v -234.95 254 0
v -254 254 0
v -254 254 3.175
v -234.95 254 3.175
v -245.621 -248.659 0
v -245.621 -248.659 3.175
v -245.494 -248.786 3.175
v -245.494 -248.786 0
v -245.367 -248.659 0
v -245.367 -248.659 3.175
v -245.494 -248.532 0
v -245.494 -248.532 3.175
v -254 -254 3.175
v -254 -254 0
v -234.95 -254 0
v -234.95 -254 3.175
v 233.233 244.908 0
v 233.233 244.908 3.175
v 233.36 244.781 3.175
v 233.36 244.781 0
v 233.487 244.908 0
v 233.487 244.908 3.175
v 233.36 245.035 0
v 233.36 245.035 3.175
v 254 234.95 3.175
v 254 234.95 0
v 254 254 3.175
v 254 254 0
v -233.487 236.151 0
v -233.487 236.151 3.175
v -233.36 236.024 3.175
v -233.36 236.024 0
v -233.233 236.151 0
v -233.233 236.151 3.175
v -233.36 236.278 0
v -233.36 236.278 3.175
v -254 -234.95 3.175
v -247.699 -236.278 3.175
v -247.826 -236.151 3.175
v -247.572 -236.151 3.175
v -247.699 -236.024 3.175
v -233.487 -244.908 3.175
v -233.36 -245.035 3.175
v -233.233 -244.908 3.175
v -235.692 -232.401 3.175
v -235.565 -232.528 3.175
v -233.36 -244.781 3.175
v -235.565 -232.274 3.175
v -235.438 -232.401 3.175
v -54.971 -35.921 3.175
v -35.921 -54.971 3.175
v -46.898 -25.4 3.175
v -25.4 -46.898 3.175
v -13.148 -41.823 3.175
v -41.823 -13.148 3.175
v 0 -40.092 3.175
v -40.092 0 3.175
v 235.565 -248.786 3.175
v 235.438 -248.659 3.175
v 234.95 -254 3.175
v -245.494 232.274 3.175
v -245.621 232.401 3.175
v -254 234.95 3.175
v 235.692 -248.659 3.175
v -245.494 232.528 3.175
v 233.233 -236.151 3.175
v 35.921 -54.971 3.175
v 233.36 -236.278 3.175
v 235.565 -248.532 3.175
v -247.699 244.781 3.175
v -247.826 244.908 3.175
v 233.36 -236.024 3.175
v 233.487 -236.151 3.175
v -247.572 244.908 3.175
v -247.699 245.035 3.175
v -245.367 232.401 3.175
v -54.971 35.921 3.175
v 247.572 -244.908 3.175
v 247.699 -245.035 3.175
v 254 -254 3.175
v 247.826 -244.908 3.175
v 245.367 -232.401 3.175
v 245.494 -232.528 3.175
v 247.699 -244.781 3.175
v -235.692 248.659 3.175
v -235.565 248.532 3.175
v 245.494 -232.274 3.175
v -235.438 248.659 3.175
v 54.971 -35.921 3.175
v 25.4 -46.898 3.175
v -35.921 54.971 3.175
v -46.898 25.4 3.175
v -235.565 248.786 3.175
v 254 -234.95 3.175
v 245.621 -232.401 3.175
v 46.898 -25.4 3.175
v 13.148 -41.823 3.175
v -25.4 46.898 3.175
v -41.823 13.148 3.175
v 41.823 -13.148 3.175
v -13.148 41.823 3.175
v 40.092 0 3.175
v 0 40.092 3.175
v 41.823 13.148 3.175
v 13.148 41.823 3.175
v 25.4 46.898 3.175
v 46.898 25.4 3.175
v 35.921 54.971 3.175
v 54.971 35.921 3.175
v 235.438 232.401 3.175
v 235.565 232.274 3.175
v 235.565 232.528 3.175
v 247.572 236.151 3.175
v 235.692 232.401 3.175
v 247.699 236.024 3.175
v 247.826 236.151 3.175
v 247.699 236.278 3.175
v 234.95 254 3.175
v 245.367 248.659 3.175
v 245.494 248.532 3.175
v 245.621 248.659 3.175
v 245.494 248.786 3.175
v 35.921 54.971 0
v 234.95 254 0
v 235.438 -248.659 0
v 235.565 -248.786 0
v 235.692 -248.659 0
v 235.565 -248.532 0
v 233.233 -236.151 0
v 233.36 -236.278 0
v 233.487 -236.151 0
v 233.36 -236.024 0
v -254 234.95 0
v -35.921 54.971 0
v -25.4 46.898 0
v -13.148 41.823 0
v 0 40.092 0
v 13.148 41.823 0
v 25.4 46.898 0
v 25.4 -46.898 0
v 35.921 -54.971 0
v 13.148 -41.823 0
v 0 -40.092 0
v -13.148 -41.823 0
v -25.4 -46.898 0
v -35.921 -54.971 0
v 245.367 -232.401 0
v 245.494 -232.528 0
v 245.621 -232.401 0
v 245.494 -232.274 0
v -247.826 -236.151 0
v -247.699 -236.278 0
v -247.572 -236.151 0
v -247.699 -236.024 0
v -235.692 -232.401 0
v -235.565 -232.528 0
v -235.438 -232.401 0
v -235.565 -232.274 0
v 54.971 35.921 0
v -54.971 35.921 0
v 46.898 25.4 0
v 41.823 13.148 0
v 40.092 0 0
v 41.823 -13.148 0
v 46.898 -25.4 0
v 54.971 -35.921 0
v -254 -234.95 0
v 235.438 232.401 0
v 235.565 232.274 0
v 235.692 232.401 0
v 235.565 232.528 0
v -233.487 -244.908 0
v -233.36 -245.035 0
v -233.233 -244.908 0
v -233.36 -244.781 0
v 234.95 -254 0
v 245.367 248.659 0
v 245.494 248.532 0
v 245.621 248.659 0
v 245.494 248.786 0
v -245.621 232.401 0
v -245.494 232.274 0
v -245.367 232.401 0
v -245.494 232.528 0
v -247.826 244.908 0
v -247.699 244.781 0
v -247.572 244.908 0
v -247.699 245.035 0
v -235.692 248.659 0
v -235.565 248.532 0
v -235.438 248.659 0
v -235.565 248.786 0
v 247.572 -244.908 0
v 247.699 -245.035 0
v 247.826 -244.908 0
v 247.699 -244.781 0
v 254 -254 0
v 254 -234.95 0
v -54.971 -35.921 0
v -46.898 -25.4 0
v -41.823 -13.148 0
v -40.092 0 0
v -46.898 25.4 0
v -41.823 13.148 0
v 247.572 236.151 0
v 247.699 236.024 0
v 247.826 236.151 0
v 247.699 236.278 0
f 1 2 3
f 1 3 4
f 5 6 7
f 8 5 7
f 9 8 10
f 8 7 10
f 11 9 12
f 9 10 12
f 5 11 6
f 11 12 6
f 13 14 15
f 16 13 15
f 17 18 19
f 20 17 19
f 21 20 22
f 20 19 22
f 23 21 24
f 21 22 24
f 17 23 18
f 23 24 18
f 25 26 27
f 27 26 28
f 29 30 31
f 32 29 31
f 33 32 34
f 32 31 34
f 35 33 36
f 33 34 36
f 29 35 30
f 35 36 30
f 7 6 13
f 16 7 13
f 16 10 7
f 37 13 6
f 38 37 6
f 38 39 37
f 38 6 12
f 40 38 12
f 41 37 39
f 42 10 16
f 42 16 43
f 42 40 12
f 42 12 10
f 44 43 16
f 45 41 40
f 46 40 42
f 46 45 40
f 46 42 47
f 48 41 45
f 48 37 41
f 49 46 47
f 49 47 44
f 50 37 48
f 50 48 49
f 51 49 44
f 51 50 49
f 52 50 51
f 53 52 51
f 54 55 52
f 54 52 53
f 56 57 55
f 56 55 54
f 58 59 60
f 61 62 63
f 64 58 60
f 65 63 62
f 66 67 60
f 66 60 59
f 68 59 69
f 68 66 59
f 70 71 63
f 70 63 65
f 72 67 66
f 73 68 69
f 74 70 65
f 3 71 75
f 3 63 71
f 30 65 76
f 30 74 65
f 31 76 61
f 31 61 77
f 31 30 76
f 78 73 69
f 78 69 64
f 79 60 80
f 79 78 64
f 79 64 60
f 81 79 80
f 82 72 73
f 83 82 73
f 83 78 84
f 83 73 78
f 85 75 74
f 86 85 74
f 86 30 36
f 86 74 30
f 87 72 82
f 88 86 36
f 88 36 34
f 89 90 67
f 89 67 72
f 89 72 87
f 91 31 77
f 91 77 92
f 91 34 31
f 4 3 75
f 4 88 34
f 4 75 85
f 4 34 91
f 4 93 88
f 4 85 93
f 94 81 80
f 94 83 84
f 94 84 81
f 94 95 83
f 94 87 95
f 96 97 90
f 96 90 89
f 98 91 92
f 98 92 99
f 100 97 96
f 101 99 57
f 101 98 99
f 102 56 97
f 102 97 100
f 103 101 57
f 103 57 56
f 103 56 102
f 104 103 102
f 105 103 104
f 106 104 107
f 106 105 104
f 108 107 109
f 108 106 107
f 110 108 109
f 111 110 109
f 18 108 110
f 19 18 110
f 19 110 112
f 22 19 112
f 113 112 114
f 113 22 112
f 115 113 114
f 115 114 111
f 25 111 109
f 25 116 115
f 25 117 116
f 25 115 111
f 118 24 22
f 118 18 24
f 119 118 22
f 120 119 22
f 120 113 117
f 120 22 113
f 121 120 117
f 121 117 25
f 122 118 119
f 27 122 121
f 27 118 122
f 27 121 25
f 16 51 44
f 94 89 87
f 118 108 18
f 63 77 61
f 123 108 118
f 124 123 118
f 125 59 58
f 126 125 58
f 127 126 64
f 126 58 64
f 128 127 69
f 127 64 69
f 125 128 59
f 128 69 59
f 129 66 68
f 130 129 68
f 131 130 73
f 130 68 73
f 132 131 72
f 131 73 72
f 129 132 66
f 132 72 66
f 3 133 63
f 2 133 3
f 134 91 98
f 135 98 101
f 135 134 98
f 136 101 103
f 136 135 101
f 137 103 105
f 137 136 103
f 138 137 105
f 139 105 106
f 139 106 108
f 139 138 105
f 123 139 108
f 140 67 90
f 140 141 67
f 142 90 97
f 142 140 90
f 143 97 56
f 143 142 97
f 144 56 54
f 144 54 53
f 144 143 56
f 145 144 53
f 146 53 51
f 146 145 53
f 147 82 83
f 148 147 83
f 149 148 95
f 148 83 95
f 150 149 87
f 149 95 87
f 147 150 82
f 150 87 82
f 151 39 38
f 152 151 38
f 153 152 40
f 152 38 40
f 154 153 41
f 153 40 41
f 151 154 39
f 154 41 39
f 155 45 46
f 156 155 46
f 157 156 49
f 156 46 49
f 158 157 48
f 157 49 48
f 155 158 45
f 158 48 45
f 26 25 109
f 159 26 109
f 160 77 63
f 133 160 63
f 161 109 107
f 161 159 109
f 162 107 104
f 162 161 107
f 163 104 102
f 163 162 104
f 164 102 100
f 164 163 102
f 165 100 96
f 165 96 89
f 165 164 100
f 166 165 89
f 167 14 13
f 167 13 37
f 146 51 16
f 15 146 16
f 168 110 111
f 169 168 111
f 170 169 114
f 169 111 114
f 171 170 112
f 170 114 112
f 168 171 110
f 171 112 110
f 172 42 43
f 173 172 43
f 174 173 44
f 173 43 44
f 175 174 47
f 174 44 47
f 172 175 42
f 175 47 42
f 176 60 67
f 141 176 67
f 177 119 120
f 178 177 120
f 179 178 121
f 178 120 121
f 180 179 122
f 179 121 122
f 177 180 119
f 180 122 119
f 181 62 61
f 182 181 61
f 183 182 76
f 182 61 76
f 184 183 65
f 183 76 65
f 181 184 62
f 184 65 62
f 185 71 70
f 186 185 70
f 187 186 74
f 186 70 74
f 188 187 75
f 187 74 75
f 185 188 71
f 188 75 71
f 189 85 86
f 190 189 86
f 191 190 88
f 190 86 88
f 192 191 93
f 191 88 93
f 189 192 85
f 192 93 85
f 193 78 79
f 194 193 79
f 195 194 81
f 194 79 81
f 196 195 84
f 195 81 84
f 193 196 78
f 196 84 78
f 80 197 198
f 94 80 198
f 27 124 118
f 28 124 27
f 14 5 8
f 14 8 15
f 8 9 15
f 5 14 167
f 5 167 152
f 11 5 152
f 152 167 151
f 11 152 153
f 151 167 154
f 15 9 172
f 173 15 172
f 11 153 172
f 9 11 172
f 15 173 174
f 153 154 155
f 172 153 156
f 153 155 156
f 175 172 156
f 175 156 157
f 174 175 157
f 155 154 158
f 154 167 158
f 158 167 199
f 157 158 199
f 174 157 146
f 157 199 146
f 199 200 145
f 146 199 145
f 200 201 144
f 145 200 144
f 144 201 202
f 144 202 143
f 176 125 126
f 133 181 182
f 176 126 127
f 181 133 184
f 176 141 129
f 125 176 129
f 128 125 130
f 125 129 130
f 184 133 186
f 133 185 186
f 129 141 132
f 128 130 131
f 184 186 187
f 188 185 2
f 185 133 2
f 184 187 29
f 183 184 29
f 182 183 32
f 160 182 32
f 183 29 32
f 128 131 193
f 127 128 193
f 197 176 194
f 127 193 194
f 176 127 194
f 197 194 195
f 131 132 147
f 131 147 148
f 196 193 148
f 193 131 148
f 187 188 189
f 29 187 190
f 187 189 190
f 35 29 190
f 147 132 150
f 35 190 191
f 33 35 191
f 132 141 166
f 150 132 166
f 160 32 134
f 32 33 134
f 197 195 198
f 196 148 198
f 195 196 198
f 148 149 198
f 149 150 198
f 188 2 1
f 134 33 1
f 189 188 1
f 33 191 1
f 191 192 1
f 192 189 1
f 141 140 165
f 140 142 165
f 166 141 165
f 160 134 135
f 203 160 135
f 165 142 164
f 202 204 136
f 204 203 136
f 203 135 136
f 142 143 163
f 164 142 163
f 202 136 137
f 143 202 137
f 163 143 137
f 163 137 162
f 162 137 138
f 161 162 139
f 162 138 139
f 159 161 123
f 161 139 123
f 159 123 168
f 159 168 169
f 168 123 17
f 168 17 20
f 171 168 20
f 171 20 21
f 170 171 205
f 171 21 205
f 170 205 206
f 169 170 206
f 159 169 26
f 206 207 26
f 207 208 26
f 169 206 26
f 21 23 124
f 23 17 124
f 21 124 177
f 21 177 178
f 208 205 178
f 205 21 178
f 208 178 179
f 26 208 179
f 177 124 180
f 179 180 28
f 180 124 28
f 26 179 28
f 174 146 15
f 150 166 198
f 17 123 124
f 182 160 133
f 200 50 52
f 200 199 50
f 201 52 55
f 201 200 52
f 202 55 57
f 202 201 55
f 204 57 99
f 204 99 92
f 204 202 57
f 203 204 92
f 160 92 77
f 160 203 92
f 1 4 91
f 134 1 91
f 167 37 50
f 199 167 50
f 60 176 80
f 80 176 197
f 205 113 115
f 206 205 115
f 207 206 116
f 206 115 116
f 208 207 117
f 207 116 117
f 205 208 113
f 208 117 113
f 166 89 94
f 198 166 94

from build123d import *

# Parameters (mm, degrees)
F0_W     = 508
F0_H     = 508
F1_DEPTH = 3.175
F3_DEPTH = 3.176
F4_R     = 50.8
F6_D     = 0.254


with BuildPart() as f1:
    # F0 (on Top) → F1 (new body)
    with BuildSketch(Plane.XY):
        Rectangle(F0_W, F0_H)
    extrude(amount=F1_DEPTH)

    # F2 (on face) → F3 (cut, through all)
    with BuildSketch(Plane.XY.offset(3.175)):
        Polygon((-19.05, 0), (-254, 234.95), (-254, -234.95), align=None)
        Polygon((-234.95, 254), (0, 19.05), (234.95, 254), align=None)
        Polygon((254, -234.95), (254, 234.95), (19.05, 0), align=None)
        Polygon((-234.95, -254), (234.95, -254), (0, -19.05), align=None)
    extrude(amount=-F3_DEPTH, mode=Mode.SUBTRACT)

    # F4
    f4_edges = [f1.edges().sort_by_distance(p)[0] for p in [
        (-19.05, 0, 1.5875),
        (0, -19.05, 1.5875),
        (19.05, 0, 1.5875),
        (0, 19.05, 1.5875),
    ]]
    fillet(f4_edges, radius=F4_R)

    # F6 (through all)
    with Locations(Plane(origin=(0, 0, 0), x_dir=(1, 0, 0), z_dir=(0, 0, -1))):
        with Locations((-247.698735, -244.907756), (-245.49396, -232.400599), (-233.360497, -236.151476), (-235.565272, -248.658633), (-245.49396, 248.658633), (-233.360497, 244.907756), (-235.565272, 232.400599), (-247.698735, 236.151476), (233.360497, -244.907756), (245.49396, -248.658633), (247.698735, -236.151476), (235.565272, -232.400599), (245.49396, 232.400599), (233.360497, 236.151476), (235.565272, 248.658633), (247.698735, 244.907756)):
            Hole(F6_D / 2)


solid = f1.part
